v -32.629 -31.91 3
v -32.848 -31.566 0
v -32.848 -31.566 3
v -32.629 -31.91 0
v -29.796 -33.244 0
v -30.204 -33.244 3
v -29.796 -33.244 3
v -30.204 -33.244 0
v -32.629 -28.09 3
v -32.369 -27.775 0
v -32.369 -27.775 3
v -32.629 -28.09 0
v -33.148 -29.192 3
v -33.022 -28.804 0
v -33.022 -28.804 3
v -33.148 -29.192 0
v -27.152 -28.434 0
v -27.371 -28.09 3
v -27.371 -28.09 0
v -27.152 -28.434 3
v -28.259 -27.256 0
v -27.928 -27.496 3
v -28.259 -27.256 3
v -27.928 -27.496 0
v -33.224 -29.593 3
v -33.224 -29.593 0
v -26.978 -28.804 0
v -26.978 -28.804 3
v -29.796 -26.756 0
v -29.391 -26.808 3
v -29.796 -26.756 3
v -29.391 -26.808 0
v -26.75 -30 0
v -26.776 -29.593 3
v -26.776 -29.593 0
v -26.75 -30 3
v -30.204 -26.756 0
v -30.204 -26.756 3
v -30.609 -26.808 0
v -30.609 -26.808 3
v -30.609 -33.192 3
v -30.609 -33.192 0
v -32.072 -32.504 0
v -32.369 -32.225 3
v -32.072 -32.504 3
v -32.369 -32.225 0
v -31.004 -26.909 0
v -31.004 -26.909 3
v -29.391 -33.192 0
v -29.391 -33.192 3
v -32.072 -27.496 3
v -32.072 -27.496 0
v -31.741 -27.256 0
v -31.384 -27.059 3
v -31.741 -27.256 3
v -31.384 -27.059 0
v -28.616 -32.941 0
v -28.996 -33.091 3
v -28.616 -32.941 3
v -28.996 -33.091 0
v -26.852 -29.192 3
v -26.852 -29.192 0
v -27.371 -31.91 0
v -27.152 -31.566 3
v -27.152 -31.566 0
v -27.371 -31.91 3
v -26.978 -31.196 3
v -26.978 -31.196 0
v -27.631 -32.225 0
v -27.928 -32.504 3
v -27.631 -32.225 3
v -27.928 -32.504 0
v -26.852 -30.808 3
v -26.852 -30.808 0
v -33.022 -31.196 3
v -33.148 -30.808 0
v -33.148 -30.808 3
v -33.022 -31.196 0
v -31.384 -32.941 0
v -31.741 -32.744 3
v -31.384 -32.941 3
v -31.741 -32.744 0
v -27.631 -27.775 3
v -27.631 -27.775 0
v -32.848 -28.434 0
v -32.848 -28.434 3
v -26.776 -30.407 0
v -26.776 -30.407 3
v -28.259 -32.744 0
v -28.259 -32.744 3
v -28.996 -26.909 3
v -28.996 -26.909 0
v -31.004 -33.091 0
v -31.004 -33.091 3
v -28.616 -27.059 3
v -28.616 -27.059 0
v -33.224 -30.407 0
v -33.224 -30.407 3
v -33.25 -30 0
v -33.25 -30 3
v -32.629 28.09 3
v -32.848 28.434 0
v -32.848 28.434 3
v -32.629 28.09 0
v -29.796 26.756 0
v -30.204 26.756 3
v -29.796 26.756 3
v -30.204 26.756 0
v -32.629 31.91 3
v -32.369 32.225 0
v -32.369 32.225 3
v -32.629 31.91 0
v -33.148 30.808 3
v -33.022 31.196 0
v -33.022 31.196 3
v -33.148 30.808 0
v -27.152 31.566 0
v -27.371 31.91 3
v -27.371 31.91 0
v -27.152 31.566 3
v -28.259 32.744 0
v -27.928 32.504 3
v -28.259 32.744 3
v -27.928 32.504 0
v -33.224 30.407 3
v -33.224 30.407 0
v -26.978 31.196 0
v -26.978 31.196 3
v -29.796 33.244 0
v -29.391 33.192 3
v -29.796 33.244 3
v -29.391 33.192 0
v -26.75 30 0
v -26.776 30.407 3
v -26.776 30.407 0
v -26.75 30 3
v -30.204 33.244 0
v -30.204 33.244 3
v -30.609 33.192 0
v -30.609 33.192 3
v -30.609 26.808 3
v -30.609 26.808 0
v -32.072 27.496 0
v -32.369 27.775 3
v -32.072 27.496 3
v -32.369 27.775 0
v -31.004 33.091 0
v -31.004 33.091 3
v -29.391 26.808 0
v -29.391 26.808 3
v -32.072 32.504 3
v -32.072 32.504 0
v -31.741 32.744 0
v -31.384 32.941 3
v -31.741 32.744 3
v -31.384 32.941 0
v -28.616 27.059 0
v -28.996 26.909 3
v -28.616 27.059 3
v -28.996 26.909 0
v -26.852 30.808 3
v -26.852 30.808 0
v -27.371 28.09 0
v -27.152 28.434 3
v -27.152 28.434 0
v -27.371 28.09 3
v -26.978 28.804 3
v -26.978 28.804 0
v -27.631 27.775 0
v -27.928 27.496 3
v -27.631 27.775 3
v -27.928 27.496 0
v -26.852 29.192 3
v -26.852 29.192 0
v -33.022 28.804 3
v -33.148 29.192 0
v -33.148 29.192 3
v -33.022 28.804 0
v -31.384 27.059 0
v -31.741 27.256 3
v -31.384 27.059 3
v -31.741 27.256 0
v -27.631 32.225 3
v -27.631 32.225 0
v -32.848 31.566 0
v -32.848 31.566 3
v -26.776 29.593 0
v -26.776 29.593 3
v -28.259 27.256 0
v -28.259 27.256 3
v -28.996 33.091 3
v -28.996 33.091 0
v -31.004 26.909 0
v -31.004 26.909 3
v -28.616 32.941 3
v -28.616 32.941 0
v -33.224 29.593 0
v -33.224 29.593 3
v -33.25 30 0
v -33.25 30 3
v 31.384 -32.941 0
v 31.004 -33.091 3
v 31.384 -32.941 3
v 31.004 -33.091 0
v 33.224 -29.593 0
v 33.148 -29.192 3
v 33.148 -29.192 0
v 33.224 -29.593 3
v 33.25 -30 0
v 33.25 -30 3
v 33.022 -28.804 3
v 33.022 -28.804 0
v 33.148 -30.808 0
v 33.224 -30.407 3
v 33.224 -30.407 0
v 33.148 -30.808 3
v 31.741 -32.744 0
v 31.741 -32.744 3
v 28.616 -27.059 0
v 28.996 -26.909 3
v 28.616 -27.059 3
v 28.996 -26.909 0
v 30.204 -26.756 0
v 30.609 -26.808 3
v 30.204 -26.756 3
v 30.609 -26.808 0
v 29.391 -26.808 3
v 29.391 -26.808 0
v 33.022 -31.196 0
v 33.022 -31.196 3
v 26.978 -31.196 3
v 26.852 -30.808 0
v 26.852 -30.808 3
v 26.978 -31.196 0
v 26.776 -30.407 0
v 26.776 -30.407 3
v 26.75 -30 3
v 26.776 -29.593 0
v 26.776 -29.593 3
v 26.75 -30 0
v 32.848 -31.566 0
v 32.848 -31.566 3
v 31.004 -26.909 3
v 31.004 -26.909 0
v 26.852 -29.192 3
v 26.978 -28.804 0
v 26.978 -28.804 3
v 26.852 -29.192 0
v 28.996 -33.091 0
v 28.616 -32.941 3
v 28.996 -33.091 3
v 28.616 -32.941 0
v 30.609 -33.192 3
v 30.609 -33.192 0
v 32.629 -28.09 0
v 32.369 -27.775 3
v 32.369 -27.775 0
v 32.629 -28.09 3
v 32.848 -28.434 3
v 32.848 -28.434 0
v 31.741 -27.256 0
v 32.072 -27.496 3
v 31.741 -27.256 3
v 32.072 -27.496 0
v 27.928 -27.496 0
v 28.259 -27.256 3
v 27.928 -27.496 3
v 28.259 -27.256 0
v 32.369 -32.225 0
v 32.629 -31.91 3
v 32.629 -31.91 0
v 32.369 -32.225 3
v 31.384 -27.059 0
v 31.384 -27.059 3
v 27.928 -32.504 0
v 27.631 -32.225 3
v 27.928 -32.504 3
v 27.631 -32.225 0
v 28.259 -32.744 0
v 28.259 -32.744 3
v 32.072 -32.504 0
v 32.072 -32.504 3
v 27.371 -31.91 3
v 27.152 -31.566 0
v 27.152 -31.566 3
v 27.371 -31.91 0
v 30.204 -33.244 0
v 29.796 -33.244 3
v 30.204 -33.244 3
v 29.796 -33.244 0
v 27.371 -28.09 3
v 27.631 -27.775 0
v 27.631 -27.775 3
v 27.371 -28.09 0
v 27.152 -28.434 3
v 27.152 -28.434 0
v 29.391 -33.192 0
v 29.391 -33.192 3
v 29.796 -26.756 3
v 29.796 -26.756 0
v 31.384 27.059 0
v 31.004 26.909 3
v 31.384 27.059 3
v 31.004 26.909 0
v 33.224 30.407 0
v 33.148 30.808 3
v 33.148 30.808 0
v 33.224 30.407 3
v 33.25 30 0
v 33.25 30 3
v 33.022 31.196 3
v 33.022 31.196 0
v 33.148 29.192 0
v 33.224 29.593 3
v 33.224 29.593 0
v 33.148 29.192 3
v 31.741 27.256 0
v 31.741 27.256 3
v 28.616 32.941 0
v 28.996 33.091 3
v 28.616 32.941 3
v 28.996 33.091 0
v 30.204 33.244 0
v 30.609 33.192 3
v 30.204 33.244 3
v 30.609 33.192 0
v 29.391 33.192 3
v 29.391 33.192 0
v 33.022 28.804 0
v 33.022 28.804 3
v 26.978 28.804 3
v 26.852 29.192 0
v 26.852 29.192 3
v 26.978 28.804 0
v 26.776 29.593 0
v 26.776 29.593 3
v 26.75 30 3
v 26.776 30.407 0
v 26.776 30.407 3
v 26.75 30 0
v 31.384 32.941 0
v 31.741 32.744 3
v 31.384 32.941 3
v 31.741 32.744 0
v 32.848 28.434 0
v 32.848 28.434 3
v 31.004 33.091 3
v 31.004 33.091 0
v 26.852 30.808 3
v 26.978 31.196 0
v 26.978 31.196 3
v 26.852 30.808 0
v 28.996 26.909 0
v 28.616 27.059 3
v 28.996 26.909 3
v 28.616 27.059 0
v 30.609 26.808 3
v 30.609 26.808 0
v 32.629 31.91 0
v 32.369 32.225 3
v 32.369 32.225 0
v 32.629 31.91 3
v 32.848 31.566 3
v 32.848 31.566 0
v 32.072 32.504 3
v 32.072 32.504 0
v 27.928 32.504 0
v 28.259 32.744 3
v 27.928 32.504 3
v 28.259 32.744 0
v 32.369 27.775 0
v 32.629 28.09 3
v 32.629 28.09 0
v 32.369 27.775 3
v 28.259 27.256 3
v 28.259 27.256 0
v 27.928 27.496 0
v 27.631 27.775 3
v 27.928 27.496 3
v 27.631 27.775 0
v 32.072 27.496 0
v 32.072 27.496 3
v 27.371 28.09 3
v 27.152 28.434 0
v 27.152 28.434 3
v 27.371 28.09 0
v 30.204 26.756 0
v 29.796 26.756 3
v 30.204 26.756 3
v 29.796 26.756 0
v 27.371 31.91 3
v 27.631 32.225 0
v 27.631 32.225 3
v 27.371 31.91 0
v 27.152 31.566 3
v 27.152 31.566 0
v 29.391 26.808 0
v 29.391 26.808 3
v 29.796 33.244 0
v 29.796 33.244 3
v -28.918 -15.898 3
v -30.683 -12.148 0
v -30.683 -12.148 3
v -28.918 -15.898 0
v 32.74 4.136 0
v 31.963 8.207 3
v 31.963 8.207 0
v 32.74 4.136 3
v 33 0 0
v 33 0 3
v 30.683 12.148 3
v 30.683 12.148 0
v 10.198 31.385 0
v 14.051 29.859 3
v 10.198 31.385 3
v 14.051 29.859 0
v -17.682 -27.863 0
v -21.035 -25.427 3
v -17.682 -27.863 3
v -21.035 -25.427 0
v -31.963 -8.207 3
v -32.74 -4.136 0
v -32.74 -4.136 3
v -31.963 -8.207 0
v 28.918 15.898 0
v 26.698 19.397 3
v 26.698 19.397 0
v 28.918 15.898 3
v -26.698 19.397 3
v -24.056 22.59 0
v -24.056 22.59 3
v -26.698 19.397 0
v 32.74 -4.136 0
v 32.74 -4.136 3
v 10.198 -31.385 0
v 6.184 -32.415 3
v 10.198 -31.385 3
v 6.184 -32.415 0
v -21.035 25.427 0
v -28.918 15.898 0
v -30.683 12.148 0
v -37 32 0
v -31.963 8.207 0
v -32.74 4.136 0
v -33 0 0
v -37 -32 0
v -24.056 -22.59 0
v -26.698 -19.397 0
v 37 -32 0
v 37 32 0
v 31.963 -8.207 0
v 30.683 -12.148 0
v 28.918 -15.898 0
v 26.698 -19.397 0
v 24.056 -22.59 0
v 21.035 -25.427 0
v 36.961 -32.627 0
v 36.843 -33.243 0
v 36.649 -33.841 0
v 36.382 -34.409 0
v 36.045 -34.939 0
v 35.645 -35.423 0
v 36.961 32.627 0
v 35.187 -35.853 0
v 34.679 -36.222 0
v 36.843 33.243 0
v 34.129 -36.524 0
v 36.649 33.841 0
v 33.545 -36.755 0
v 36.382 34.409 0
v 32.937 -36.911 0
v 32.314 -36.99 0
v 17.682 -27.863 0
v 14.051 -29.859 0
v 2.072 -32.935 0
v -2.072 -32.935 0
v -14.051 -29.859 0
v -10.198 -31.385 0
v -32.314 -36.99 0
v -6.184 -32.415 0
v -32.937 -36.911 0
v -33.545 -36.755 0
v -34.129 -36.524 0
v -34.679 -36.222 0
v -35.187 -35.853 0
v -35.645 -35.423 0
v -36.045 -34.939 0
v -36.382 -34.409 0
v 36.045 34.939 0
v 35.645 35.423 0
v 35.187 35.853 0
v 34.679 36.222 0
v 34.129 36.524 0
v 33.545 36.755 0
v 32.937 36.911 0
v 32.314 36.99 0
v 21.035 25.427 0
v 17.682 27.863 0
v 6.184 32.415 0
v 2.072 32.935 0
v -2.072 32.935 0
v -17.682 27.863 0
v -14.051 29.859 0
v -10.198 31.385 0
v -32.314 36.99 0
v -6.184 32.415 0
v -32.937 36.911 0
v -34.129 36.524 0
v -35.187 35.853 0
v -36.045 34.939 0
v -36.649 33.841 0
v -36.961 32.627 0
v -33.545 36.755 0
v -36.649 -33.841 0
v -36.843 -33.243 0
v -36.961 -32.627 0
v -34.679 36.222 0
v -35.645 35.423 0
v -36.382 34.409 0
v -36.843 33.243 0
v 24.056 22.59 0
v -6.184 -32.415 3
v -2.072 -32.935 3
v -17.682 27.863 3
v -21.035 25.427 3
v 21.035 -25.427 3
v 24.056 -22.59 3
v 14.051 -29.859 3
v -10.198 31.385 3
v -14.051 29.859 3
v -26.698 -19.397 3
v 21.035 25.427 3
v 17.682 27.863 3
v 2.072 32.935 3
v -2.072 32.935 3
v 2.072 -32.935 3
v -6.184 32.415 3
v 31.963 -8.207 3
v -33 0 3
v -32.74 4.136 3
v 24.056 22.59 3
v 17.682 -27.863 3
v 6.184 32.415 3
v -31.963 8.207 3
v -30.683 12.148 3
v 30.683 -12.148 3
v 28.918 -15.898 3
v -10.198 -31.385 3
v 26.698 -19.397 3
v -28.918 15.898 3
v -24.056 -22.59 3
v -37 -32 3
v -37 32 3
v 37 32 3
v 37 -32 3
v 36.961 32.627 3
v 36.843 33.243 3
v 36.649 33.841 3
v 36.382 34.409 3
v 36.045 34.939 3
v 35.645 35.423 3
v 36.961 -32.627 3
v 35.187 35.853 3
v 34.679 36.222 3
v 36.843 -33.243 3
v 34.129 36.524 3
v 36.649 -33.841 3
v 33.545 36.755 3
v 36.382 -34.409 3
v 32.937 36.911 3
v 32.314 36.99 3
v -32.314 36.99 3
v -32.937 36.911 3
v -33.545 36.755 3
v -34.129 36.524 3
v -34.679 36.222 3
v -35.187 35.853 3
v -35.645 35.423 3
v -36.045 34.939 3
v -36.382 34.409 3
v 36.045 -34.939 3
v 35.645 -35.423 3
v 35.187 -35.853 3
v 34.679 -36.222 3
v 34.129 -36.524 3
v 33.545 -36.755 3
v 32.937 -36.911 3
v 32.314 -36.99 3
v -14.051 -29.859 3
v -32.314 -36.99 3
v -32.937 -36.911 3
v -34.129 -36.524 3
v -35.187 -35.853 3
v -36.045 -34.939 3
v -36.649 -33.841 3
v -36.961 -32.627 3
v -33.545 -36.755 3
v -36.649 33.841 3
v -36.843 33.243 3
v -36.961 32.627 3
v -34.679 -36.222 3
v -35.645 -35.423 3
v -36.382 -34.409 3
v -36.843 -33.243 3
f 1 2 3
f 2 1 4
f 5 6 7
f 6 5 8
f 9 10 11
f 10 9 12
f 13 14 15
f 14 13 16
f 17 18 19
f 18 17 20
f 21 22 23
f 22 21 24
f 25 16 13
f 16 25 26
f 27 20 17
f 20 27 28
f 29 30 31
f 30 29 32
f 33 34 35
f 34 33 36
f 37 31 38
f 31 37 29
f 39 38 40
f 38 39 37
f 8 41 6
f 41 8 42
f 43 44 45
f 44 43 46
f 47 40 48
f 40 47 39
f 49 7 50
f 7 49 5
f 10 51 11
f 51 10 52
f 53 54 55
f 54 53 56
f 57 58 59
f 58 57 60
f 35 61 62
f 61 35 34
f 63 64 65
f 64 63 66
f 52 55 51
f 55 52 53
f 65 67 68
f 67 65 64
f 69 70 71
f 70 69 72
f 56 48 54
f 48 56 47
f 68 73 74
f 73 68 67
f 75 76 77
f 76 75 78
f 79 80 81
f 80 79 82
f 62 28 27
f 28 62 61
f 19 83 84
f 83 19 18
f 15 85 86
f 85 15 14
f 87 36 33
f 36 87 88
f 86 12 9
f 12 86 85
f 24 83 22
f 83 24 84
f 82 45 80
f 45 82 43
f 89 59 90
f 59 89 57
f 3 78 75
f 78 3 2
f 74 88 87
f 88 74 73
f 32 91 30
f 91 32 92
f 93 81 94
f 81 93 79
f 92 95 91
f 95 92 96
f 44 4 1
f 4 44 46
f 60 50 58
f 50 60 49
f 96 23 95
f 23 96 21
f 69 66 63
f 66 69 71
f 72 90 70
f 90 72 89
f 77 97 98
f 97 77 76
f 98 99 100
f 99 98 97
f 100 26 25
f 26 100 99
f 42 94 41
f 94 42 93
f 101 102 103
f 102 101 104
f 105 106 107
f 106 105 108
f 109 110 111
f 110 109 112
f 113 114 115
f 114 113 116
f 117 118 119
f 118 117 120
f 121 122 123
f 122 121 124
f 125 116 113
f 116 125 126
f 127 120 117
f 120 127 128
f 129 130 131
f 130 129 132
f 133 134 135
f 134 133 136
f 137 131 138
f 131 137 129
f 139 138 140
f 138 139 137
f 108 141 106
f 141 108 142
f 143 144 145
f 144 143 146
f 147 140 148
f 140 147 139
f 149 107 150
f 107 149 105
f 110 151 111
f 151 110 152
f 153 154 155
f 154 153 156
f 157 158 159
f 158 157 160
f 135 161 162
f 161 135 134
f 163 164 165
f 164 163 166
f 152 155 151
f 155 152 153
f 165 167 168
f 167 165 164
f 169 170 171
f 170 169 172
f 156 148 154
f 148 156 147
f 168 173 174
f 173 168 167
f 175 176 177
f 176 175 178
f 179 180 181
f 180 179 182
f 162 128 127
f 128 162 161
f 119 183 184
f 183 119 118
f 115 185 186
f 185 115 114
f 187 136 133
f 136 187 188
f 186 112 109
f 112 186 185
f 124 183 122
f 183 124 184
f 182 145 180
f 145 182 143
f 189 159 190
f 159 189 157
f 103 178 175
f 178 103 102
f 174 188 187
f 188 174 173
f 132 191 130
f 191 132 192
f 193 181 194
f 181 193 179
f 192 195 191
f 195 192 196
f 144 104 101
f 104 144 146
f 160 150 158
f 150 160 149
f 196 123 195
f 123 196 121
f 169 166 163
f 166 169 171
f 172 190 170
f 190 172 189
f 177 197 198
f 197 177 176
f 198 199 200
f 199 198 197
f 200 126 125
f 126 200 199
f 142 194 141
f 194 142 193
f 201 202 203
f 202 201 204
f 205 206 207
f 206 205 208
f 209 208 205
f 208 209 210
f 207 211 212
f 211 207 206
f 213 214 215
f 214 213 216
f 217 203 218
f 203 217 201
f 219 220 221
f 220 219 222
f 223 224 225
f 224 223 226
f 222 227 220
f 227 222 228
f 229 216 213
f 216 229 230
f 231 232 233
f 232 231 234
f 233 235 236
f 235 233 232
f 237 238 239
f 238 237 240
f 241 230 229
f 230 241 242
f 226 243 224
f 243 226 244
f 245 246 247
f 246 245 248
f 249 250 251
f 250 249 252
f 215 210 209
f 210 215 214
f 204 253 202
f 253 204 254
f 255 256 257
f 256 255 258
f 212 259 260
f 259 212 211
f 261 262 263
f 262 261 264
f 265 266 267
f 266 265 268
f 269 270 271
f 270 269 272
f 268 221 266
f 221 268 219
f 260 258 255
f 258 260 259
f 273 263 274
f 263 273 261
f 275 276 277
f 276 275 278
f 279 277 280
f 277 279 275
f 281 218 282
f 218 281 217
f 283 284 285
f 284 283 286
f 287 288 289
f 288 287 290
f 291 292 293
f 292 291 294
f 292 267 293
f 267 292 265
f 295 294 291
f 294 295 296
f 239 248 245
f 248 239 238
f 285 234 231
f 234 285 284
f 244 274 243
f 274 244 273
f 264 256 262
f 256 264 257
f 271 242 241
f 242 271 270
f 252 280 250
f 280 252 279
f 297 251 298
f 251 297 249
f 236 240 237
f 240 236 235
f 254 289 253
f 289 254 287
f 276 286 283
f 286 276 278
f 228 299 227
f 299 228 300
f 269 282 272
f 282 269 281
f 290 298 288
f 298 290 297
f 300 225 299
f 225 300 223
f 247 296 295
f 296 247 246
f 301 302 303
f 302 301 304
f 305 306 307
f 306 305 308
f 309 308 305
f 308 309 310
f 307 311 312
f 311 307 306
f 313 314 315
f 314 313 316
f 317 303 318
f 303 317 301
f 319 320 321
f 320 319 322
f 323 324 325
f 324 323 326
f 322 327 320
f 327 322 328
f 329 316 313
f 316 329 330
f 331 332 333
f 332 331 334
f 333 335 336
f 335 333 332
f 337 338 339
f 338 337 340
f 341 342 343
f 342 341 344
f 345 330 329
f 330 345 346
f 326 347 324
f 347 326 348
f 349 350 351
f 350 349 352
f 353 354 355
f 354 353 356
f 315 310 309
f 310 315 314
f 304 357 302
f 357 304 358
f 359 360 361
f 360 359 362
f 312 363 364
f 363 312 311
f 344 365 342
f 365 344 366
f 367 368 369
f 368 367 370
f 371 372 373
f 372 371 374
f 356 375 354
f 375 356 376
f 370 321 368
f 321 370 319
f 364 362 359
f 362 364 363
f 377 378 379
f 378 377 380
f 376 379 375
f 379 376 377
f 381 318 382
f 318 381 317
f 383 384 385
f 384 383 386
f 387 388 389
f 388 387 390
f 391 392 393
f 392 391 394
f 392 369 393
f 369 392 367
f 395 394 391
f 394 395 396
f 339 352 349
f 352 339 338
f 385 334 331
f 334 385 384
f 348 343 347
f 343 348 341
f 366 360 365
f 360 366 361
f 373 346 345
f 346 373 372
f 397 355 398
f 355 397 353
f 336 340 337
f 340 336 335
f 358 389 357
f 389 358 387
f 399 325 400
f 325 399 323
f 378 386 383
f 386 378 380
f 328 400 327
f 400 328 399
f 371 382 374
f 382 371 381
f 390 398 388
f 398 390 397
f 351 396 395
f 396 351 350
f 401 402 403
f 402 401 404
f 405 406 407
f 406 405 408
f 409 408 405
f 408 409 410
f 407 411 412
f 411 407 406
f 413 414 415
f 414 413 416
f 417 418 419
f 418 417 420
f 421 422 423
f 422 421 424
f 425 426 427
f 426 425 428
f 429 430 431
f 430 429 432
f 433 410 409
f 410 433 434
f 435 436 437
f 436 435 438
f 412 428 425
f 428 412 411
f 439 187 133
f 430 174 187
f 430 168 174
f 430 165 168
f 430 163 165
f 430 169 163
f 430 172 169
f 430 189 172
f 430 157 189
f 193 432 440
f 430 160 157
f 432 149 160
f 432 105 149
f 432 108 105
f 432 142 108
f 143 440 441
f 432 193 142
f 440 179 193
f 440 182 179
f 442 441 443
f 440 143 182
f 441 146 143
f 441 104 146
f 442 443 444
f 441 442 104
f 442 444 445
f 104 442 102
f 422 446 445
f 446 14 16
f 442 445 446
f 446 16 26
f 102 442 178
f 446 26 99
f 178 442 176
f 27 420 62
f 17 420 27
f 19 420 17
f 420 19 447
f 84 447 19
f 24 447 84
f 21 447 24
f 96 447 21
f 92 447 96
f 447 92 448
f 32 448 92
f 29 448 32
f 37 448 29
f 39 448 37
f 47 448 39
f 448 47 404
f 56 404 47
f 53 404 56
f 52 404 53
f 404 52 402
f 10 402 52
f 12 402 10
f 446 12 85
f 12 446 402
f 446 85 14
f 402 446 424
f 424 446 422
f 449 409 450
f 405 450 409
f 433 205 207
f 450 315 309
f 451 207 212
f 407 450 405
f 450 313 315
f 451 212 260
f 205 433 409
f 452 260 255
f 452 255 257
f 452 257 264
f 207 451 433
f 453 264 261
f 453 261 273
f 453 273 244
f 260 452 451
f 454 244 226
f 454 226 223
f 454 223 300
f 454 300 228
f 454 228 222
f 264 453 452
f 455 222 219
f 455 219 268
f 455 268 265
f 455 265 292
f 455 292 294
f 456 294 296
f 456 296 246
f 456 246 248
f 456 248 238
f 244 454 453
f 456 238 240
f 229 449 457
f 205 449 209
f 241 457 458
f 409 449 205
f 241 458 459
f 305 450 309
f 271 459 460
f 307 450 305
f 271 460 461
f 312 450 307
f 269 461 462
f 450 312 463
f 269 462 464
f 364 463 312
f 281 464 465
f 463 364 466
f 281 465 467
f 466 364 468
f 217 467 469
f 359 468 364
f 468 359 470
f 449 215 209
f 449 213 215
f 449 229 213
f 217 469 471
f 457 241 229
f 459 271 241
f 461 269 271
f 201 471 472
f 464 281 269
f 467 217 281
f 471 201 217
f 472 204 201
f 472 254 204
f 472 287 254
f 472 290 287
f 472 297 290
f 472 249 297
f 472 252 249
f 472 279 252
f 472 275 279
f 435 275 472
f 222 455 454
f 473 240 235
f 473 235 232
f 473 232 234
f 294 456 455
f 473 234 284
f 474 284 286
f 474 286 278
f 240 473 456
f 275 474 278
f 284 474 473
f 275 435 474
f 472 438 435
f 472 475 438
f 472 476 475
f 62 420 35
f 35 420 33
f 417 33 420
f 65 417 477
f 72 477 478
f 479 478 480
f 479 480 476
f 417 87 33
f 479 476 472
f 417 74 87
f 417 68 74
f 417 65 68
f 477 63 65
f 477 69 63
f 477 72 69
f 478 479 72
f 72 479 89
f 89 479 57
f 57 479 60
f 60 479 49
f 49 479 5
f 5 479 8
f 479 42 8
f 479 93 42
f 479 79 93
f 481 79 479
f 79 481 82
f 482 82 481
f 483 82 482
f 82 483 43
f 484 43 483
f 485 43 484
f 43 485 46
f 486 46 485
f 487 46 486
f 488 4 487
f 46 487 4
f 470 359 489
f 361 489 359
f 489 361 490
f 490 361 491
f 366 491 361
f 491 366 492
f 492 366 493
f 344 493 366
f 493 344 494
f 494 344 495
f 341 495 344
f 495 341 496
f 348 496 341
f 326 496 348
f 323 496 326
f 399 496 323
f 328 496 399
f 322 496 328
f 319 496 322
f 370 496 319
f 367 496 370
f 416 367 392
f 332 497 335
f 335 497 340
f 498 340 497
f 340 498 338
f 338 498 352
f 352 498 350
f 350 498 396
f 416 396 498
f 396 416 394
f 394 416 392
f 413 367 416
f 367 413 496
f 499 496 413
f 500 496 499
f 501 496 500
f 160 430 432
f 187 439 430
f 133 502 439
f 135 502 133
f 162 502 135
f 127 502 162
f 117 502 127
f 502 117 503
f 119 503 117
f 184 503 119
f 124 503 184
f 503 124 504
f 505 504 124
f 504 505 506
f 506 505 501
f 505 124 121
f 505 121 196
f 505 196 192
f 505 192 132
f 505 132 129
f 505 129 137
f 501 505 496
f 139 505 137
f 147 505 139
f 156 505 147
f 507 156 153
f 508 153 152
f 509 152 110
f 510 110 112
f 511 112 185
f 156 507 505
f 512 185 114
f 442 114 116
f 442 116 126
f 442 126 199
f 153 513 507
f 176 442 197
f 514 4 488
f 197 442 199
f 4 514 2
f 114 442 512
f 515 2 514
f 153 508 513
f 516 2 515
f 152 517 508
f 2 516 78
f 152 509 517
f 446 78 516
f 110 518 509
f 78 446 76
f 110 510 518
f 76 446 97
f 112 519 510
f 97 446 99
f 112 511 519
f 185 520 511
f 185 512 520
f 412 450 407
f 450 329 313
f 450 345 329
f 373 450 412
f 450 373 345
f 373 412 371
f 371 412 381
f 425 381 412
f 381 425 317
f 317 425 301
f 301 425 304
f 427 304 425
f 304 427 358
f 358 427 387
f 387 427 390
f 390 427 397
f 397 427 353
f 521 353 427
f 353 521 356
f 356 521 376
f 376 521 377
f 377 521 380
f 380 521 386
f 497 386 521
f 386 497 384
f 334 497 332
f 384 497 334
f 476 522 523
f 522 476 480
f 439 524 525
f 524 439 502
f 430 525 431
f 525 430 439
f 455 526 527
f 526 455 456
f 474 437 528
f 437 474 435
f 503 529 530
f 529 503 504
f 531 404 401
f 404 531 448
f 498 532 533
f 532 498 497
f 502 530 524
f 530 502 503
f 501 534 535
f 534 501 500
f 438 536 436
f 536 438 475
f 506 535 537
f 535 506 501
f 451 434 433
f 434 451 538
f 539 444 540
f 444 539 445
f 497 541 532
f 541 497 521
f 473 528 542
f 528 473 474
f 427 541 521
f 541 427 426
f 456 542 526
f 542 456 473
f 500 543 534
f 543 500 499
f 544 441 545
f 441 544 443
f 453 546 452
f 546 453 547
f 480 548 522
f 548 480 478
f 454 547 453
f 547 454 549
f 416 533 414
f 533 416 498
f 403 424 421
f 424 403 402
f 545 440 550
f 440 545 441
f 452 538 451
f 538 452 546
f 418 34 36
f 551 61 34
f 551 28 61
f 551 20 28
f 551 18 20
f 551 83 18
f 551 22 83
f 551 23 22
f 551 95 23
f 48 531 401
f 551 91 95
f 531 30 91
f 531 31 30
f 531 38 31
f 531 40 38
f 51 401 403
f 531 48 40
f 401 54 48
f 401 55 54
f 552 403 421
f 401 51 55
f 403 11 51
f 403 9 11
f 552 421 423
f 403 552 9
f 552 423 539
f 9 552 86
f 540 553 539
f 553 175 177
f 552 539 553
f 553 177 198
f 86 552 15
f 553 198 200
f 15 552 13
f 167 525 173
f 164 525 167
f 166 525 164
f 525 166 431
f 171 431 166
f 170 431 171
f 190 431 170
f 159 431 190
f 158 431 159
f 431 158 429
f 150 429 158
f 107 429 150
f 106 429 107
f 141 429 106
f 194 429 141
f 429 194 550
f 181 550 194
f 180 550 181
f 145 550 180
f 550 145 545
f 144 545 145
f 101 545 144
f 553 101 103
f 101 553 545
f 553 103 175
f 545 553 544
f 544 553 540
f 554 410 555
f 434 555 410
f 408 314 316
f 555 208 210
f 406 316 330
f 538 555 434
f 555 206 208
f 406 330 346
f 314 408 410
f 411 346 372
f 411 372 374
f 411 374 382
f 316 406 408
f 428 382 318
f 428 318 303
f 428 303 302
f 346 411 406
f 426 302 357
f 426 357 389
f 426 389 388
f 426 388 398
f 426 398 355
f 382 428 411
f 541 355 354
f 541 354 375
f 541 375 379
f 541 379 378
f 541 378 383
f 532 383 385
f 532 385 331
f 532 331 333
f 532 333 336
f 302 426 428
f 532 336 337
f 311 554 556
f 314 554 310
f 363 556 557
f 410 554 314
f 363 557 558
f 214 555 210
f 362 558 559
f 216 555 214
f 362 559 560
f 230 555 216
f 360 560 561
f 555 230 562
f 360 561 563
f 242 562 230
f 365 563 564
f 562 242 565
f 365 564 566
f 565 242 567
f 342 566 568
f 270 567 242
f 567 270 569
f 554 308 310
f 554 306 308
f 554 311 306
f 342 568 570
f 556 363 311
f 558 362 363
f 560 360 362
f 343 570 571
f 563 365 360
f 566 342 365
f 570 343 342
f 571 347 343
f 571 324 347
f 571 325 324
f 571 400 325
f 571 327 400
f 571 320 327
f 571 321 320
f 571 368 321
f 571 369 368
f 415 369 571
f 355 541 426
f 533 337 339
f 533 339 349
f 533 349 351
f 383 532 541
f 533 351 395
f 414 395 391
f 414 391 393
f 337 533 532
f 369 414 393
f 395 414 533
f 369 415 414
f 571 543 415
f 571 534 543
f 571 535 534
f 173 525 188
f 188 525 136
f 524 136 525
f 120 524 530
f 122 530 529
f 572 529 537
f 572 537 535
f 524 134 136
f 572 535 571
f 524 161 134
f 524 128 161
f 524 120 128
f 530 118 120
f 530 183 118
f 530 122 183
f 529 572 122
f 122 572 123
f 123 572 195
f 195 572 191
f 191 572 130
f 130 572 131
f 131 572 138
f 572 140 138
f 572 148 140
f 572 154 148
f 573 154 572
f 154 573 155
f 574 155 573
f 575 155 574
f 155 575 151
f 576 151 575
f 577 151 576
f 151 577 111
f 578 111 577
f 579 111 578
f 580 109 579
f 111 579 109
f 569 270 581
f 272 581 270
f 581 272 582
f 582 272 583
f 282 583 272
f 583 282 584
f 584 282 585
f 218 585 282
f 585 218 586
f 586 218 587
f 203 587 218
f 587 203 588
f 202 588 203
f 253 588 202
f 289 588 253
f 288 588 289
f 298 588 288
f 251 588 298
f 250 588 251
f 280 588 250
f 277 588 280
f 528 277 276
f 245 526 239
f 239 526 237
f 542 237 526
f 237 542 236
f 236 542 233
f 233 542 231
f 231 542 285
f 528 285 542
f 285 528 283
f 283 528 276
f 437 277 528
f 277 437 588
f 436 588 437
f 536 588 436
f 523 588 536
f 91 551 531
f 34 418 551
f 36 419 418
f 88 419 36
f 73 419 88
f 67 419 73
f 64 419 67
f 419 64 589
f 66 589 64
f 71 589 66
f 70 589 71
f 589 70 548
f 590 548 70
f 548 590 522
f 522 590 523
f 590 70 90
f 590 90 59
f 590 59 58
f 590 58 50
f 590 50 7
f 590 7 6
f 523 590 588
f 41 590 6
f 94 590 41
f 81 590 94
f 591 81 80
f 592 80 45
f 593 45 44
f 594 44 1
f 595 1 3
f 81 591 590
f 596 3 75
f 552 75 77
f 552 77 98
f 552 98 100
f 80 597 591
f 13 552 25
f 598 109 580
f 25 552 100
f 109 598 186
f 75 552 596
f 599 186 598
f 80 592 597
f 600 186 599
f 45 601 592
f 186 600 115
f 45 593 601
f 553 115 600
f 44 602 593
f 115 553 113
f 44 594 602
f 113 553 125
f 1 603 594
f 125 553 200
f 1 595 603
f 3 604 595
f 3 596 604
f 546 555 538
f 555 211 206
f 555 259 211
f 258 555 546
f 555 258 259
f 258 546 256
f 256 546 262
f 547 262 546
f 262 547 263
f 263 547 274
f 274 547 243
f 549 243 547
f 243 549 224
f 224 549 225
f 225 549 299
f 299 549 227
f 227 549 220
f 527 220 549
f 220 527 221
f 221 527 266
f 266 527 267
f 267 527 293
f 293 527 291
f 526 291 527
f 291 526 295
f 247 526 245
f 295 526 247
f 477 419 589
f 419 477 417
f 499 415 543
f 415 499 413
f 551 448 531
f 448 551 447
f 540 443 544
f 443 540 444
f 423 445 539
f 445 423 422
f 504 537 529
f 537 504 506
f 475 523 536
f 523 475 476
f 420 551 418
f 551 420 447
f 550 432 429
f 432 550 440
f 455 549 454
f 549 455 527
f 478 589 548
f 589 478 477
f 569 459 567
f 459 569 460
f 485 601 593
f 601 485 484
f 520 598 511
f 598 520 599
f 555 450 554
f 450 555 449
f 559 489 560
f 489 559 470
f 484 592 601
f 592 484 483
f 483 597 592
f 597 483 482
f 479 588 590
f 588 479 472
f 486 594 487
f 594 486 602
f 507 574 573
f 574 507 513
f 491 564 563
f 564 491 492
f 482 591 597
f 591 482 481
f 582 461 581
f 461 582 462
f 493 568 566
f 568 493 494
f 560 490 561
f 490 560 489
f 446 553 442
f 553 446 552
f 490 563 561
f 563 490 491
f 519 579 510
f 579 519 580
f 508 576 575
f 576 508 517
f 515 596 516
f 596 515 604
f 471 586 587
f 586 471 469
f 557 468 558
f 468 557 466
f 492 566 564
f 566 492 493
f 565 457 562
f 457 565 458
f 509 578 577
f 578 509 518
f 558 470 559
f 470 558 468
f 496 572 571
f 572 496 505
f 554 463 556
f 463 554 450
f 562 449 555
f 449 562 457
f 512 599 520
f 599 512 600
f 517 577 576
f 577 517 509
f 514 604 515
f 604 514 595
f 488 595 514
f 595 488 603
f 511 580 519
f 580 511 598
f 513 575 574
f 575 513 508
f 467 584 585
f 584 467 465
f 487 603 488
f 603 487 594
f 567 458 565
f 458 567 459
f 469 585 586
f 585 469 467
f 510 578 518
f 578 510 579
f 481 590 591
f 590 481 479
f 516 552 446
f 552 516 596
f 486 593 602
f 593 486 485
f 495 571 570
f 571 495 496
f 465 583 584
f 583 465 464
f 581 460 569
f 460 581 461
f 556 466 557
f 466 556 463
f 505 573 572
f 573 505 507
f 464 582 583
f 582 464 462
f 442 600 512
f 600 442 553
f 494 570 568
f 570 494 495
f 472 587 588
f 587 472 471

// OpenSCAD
$fn = 50;


difference() {
	union() {
		hull() {
			translate(v = [-32.0000000000, 32.0000000000, 0]) {
				cylinder(h = 3, r = 5);
			}
			translate(v = [32.0000000000, 32.0000000000, 0]) {
				cylinder(h = 3, r = 5);
			}
			translate(v = [-32.0000000000, -32.0000000000, 0]) {
				cylinder(h = 3, r = 5);
			}
			translate(v = [32.0000000000, -32.0000000000, 0]) {
				cylinder(h = 3, r = 5);
			}
		}
	}
	union() {
		#translate(v = [-30.0000000000, -30.0000000000, -100.0000000000]) {
			cylinder(h = 200, r = 3.2500000000);
		}
		#translate(v = [-30.0000000000, 30.0000000000, -100.0000000000]) {
			cylinder(h = 200, r = 3.2500000000);
		}
		#translate(v = [30.0000000000, -30.0000000000, -100.0000000000]) {
			cylinder(h = 200, r = 3.2500000000);
		}
		#translate(v = [30.0000000000, 30.0000000000, -100.0000000000]) {
			cylinder(h = 200, r = 3.2500000000);
		}
		#cylinder(h = 3, r = 33.0000000000);
	}
}
